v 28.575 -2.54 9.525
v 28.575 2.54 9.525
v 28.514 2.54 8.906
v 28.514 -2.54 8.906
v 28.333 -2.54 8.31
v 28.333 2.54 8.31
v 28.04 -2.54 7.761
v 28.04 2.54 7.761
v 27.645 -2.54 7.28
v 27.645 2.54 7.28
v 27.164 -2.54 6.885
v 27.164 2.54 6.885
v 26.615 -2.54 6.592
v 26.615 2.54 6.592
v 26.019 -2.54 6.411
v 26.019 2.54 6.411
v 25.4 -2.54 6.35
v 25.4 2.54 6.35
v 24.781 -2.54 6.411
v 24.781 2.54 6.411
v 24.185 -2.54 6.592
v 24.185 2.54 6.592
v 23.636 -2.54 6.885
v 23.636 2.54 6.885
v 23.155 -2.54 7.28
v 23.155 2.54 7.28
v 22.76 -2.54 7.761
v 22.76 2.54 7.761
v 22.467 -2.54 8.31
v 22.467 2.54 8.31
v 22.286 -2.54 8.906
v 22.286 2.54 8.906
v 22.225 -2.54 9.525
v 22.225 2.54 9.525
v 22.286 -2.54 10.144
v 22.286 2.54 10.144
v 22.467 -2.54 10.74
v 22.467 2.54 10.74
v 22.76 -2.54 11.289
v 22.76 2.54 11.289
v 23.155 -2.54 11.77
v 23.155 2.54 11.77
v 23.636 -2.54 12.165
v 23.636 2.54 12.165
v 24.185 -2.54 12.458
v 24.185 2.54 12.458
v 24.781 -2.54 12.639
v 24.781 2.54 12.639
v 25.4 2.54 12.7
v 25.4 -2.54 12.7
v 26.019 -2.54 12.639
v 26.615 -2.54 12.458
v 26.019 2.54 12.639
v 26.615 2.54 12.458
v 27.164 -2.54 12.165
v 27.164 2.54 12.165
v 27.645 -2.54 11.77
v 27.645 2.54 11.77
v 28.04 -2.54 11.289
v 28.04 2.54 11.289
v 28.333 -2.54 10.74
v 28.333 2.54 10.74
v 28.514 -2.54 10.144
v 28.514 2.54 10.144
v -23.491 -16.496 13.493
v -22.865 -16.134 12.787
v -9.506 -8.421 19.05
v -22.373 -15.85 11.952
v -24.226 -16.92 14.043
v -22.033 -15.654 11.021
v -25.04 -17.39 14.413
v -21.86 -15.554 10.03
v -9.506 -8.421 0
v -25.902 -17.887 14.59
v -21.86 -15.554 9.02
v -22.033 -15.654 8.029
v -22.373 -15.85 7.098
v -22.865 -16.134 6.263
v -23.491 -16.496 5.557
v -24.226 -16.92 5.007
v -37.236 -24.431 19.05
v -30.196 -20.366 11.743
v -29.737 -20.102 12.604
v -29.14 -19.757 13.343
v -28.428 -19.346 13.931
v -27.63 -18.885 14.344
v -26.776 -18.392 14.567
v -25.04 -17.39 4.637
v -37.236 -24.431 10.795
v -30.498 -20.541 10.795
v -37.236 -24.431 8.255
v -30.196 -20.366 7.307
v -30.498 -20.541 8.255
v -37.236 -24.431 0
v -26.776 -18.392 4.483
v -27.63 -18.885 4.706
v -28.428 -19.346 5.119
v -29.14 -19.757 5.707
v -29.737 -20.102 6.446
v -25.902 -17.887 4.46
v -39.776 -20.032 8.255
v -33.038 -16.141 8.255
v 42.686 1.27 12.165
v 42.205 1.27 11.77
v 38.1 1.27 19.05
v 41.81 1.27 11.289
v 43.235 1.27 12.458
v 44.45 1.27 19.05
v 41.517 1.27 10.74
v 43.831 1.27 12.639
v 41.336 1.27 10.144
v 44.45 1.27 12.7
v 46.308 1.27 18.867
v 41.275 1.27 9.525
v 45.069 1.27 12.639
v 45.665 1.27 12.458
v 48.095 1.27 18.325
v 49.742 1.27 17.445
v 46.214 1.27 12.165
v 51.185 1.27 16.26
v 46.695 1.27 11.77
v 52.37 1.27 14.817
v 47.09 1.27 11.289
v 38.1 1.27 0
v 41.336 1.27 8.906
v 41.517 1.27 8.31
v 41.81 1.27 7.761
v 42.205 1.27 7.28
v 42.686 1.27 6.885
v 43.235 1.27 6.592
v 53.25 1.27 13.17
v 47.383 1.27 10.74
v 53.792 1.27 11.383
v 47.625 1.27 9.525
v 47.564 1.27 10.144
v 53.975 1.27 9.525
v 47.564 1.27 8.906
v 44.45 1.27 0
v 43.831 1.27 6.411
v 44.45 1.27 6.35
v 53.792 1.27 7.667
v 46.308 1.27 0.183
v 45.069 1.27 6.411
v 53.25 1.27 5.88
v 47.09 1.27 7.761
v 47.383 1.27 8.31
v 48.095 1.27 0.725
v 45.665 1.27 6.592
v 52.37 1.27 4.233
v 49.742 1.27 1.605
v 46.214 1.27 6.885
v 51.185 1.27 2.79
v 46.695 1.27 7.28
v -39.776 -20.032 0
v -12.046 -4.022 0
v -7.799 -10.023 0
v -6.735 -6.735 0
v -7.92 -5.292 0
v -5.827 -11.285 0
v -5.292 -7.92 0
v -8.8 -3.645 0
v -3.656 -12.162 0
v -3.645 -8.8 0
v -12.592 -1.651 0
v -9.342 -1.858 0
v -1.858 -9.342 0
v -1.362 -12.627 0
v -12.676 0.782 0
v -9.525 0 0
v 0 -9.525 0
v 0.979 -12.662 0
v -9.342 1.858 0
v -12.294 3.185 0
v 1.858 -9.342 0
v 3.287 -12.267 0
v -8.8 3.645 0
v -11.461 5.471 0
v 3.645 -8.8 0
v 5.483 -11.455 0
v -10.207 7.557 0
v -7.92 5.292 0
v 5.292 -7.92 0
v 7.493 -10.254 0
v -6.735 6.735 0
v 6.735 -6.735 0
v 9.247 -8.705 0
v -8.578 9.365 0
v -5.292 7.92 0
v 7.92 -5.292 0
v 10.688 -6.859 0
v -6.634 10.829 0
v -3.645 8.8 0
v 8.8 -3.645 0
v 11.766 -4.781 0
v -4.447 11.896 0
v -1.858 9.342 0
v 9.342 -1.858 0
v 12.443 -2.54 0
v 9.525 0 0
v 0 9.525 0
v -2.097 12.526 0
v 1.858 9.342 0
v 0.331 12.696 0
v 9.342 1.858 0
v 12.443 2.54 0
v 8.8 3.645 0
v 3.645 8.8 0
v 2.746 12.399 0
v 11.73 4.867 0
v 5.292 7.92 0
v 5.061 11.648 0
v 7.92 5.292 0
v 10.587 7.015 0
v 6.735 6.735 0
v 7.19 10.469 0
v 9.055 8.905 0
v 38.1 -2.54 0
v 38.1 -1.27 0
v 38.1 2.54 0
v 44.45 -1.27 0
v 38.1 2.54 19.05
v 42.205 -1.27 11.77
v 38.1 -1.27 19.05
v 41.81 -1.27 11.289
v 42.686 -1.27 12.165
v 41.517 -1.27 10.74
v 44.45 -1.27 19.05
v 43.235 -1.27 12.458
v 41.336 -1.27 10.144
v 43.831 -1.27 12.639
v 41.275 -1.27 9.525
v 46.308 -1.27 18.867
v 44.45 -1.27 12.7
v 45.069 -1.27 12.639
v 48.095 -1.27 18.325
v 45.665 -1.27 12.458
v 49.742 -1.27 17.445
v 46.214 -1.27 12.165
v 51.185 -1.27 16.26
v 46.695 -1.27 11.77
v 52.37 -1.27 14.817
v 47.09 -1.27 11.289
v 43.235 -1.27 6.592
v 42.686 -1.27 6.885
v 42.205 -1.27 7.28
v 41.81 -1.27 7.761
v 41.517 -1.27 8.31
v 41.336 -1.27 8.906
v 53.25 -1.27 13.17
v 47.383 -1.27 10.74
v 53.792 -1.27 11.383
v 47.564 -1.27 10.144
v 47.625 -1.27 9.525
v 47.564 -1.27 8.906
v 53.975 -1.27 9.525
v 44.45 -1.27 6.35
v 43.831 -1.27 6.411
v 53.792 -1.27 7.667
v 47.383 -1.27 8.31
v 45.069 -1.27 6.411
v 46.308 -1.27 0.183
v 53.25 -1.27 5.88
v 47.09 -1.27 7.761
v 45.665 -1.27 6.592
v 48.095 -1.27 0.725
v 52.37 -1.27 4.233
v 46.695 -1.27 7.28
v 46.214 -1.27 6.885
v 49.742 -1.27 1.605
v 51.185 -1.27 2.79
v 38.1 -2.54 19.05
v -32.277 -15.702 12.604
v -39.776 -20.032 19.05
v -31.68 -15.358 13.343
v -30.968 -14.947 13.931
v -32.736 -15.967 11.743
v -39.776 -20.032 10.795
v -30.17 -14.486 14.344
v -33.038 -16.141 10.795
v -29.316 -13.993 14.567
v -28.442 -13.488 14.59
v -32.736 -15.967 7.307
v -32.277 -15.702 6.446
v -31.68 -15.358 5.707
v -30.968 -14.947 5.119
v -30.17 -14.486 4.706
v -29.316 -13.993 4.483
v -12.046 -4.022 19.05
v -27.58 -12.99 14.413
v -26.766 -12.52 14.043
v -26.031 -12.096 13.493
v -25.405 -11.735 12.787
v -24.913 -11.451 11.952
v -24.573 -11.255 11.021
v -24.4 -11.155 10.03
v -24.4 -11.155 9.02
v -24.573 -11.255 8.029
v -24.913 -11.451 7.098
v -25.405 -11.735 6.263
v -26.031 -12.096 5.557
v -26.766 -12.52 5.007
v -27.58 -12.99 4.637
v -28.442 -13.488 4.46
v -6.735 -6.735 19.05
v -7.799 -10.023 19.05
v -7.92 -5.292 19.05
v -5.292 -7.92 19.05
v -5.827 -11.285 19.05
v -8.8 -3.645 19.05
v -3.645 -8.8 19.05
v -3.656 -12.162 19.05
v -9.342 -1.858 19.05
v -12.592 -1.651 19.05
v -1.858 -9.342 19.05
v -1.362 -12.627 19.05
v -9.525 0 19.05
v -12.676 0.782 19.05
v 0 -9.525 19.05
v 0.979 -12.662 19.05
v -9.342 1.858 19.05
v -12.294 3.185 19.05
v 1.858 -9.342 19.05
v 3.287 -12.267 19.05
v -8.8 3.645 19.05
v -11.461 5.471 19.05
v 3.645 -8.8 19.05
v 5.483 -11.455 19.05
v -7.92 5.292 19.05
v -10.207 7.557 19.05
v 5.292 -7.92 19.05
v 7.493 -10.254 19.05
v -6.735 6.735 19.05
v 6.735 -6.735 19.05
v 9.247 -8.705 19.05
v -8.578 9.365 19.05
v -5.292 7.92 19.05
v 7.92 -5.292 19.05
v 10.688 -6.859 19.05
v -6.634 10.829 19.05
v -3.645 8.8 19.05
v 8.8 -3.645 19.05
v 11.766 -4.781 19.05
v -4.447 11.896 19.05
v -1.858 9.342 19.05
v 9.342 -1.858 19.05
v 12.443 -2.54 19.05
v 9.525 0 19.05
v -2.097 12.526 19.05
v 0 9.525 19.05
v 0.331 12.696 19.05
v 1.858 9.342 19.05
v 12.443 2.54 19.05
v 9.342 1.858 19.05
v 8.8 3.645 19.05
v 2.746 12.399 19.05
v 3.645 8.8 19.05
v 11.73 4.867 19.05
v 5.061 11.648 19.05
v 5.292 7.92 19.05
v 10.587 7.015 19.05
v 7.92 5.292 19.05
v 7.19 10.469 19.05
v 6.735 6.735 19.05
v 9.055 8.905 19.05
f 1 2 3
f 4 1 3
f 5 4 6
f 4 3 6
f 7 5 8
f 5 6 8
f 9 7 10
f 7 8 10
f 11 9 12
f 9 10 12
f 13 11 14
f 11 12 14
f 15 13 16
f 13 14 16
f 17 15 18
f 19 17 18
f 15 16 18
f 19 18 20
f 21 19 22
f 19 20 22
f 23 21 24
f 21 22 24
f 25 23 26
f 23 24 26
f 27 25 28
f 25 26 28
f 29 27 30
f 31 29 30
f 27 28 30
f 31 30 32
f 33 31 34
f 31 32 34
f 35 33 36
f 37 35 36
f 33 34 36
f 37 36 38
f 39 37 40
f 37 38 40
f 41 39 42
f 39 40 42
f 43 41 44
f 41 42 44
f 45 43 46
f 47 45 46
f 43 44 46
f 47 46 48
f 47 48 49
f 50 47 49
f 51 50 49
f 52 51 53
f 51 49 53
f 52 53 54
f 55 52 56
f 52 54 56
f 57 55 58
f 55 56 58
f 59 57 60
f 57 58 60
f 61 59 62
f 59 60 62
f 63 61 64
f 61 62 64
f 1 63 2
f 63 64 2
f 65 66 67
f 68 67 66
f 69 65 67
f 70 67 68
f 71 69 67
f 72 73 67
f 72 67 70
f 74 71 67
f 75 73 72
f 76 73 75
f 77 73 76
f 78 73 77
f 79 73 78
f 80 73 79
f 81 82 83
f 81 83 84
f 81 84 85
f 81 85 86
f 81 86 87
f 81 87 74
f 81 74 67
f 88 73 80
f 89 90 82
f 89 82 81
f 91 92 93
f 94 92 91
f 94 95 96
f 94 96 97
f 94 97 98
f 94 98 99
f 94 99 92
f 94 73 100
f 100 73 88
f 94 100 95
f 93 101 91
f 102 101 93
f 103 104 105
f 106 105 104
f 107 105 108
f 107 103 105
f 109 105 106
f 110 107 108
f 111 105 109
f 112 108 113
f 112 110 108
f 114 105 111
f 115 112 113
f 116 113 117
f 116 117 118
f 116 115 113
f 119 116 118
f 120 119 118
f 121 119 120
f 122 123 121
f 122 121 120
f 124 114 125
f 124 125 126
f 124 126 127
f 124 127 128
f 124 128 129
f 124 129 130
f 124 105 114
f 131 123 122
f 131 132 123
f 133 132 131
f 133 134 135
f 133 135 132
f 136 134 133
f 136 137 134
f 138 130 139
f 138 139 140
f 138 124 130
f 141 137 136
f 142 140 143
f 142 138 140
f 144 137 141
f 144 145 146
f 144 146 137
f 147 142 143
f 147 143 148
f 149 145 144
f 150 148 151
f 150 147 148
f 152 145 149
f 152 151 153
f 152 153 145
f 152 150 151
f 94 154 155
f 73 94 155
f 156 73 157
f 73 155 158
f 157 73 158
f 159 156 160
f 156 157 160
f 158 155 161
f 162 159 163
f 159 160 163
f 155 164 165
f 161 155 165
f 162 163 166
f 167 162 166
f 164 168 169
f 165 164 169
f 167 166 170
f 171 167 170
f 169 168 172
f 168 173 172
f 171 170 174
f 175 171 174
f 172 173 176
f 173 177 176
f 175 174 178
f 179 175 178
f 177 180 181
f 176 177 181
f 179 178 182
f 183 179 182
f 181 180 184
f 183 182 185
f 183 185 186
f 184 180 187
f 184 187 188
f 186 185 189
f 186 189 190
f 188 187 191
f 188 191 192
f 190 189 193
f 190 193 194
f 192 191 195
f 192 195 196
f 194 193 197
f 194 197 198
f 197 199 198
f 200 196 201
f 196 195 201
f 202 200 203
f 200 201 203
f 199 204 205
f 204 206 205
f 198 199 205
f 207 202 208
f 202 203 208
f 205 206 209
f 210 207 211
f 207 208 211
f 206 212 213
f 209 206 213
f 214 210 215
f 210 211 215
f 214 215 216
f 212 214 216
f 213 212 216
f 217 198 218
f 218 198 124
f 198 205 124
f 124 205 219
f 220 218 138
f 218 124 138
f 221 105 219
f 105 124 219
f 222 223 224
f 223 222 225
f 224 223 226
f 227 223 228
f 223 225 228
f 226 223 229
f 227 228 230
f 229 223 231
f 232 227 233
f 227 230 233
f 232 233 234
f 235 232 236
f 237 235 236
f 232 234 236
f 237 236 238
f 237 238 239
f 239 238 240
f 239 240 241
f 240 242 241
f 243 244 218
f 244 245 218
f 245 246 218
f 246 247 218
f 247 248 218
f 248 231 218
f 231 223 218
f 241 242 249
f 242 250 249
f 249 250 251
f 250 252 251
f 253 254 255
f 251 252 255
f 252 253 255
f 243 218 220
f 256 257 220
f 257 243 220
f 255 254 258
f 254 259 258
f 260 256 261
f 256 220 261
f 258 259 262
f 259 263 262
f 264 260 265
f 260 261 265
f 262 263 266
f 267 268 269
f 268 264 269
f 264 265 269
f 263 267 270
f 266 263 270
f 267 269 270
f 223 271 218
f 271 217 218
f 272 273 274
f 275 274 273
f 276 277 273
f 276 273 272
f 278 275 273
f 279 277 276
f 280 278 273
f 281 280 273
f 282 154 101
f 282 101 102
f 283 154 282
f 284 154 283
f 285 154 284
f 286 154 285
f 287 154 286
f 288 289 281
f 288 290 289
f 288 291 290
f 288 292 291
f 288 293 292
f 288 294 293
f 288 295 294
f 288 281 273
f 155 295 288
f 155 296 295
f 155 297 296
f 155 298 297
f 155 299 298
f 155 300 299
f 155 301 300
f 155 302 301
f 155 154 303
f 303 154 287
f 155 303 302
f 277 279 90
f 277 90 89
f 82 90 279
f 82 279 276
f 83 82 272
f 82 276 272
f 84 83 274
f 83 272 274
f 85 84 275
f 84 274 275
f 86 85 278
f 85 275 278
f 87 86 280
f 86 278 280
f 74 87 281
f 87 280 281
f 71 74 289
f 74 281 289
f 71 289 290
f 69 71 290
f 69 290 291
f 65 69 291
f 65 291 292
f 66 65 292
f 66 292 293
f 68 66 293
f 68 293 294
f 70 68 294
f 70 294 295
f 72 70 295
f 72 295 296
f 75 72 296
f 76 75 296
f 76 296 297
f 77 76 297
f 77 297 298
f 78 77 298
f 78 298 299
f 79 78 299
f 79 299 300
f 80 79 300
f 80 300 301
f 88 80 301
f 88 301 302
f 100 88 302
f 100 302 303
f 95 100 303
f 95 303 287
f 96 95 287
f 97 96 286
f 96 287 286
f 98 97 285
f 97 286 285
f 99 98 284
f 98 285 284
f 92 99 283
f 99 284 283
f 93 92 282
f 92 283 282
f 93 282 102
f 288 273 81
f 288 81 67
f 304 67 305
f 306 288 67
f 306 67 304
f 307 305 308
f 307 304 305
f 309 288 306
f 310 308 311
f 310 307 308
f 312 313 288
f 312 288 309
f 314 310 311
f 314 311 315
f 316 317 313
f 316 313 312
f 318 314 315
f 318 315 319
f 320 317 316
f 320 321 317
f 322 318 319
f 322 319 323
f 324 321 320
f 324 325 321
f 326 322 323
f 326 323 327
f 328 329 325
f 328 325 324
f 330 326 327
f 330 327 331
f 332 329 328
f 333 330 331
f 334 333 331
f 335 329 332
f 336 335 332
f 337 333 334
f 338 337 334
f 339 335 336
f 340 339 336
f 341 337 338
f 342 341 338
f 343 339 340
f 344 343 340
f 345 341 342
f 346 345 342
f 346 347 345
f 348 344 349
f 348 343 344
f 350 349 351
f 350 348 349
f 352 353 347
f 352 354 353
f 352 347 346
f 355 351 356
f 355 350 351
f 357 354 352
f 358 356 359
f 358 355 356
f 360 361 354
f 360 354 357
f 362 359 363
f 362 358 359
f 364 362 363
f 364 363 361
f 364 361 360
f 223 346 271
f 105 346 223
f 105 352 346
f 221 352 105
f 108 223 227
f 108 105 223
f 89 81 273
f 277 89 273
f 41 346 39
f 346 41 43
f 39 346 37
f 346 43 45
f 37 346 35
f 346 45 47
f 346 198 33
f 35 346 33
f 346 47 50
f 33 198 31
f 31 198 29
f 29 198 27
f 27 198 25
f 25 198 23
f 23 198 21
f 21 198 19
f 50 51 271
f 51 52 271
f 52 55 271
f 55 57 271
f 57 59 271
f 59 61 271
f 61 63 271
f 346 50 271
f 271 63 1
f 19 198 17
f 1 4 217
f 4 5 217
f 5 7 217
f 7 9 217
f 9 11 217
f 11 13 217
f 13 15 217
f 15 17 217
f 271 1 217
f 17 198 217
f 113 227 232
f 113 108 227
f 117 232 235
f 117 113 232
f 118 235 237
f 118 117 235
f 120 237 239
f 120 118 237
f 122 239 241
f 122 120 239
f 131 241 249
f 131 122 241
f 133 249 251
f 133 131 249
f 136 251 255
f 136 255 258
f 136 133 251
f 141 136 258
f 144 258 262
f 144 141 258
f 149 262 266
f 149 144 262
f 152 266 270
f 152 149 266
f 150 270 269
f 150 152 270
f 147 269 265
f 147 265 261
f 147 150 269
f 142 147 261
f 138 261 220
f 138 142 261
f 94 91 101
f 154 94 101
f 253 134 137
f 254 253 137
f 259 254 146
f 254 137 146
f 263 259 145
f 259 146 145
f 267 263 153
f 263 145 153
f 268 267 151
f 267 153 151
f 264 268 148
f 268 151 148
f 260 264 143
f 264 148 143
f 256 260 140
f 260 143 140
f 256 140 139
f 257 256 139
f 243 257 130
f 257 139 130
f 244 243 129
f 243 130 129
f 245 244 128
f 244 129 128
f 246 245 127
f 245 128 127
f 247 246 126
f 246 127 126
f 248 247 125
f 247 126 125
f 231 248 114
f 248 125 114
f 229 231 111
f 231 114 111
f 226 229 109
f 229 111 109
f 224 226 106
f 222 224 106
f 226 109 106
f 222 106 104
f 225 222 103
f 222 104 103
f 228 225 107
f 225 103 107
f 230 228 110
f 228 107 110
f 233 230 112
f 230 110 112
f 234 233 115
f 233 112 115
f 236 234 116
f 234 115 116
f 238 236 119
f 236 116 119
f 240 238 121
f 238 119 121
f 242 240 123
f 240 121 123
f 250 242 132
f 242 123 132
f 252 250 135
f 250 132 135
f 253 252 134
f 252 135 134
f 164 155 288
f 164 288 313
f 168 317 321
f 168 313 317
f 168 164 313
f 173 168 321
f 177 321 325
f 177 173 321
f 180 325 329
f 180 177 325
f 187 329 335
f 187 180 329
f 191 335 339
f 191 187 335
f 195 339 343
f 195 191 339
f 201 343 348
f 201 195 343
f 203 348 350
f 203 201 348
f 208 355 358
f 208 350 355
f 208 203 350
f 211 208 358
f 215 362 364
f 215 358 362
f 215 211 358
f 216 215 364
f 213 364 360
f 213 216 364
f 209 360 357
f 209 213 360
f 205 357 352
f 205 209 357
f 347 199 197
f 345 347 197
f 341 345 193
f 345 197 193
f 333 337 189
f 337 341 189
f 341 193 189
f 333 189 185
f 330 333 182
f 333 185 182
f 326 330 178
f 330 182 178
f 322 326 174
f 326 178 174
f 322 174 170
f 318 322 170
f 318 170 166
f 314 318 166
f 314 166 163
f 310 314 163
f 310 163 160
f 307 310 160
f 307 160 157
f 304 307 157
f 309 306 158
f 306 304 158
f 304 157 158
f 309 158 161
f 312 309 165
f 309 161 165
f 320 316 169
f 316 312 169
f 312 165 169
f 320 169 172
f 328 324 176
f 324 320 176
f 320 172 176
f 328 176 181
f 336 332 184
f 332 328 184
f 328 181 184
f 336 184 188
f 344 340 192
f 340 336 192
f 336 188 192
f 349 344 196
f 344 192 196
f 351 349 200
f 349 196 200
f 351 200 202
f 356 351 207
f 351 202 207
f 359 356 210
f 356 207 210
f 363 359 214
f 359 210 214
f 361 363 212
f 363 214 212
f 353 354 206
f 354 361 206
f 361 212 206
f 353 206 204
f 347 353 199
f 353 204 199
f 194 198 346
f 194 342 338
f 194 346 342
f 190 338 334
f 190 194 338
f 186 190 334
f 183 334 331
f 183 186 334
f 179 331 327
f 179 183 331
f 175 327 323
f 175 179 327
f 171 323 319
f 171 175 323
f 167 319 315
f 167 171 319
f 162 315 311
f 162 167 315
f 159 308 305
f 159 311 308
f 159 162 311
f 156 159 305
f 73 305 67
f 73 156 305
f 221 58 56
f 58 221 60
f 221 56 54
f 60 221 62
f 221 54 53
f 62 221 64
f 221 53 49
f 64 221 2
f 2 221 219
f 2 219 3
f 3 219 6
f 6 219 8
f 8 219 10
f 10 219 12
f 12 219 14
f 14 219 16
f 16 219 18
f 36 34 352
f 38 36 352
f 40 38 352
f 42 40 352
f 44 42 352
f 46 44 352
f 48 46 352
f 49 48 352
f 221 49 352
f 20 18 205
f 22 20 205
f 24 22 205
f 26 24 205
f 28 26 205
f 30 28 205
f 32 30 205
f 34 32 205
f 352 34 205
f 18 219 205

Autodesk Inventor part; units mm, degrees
ref_plane "YZ Plane" through (0, 0, 0) normal (1, 0, 0) x (0, 1, 0)
ref_plane "XZ Plane" through (0, 0, 0) normal (0, 1, 0) x (-1, 0, 0)
ref_plane "XY Plane" through (0, 0, 0) normal (0, 0, 1) x (1, 0, 0)
sketch "Boceto1" plane through (0, 0, 0) normal (0, 0, 1) x (1, 0, 0)
  circle A0 centre (0, 0) radius 9.525
  line L0 (12.4434, -2.54) -> (38.1, -2.54)
  line L1 (38.1, -2.54) -> (38.1, 2.54)
  line L2 (38.1, 2.54) -> (12.4434, 2.54)
  line L3 (12.7, 0) -> (9.5196, 0.3221) construction
  line L4 (9.5196, -0.3221) -> (12.7, 0) construction
  line L5 (-9.5063, -8.4214) -> (-37.2364, -24.4314)
  line L6 (-37.2364, -24.4314) -> (-39.7764, -20.032)
  line L7 (-39.7764, -20.032) -> (-12.0463, -4.022)
  line L8 (0.4725, -1.9521) -> (-1.0609, -2.54) construction
  arc A1 (12.4434, 2.54) -> (-12.0463, -4.022) centre (0, 0) ccw
  arc A2 (-9.5063, -8.4214) -> (12.4434, -2.54) centre (0, 0) ccw
  line L9 (38.1, -1.27) -> (44.45, -1.27)
  line L10 (44.45, -1.27) -> (44.45, 1.27)
  line L11 (44.45, 1.27) -> (38.1, 1.27)
  point P0 (-23.3714, -16.4264)
  point P1 (-38.5064, -22.2317)
  point P2 (41.275, -1.27)
  point P3 (41.275, 1.27)
  dimension "d0" = 19.05
  dimension "d3" = 5.08
  dimension "d4" = 2.54
  dimension "d7" = 5.08
  dimension "d8" = 38.5064
  dimension "d9" = 2.54
  dimension "d10" = 44.4634
  dimension "d11" = 3.175
  dimension "d12" = 3.175
  dimension "d13" = 38.1
  dimension "d14" = 6.35
  dimension "d16" = 2.54
  dimension "d17" = 1.27
extrude "Extrusión1" add sketch "Boceto1" along normal blind 19.05
sketch "Boceto2" plane through (38.1, 1.27, 0) normal (0, 1, 0) x (1, 0, 0)
  line L0 (6.35, 0) -> (0, 0) projected
  line L1 (6.35, -19.05) -> (0, -19.05) projected
  line L2 (6.35, 0) -> (6.35, -19.05)
  arc A0 (6.35, -19.05) -> (6.35, 0) centre (6.35, -9.525) ccw
  point P0 (-38.1, 0)
extrude "Extrusión2" add sketch "Boceto2" against normal blind 2.54
sketch "Boceto3" plane through (38.1, 1.27, 19.05) normal (0, 1, 0) x (1, 0, 0)
  line L0 (0, 19.05) -> (0, 0) projected
  line L1 (0, 19.05) -> (0, 9.525)
  line L2 (0, 19.05) -> (6.35, 19.05) projected
  line L3 (0, 0) -> (6.35, 0) projected
  line L4 (6.35, 19.05) -> (6.35, 0)
  line L5 (6.35, 0) -> (6.35, 9.525)
  circle A0 centre (6.35, 9.525) radius 3.175
  point P0 (-38.1, 19.05)
  dimension "d22" = 6.35
extrude "Extrusión3" cut sketch "Boceto3" against normal blind 2.54 contours A0 L4 | L4 A0
sketch "Boceto4" plane through (12.4434, 2.54, 0) normal (0, 1, 0) x (1, 0, 0)
  line L0 (25.7224, -0.5661) -> (25.7224, -18.5033)
  line L1 (25.7224, -18.5033) -> (25.6566, -9.525)
  line L2 (25.6566, 0) -> (25.6566, -19.05) projected
  line L3 (25.6566, -9.525) -> (12.9566, -9.525)
  circle A0 centre (12.9566, -9.525) radius 3.175
  point P0 (-12.4434, 0)
  dimension "d25" = 12.7
  dimension "d26" = 6.35
extrude "Extrusión4" cut sketch "Boceto4" against normal blind 5.08
sketch "Boceto5" plane through (-39.7764, -20.032, 19.05) normal (-0.5, 0.866, 0) x (0.866, 0.5, 0)
  line L0 (0, 19.05) -> (0, 0) projected
  line L1 (0, 0) -> (0, 19.05)
  line L2 (0, 19.05) -> (0, 9.525)
  line L3 (0, 9.525) -> (12.7, 9.525)
  circle A0 centre (12.7, 9.525) radius 5.08
  line L4 (7.7813, 8.255) -> (0, 8.255)
  line L5 (0, 8.255) -> (0, 10.795)
  line L6 (0, 10.795) -> (7.7813, 10.795)
  point P0 (44.4634, 19.05)
  point P1 (6.35, 9.525)
  point P2 (0, 10.795)
  point P3 (0, 8.255)
  dimension "d29" = 12.7
  dimension "d30" = 10.16
  dimension "d31" = 1.27
  dimension "d32" = 1.27
extrude "Extrusión5" cut sketch "Boceto5" against normal blind 5.08
properties part number "Pieza1-Tarea1"
